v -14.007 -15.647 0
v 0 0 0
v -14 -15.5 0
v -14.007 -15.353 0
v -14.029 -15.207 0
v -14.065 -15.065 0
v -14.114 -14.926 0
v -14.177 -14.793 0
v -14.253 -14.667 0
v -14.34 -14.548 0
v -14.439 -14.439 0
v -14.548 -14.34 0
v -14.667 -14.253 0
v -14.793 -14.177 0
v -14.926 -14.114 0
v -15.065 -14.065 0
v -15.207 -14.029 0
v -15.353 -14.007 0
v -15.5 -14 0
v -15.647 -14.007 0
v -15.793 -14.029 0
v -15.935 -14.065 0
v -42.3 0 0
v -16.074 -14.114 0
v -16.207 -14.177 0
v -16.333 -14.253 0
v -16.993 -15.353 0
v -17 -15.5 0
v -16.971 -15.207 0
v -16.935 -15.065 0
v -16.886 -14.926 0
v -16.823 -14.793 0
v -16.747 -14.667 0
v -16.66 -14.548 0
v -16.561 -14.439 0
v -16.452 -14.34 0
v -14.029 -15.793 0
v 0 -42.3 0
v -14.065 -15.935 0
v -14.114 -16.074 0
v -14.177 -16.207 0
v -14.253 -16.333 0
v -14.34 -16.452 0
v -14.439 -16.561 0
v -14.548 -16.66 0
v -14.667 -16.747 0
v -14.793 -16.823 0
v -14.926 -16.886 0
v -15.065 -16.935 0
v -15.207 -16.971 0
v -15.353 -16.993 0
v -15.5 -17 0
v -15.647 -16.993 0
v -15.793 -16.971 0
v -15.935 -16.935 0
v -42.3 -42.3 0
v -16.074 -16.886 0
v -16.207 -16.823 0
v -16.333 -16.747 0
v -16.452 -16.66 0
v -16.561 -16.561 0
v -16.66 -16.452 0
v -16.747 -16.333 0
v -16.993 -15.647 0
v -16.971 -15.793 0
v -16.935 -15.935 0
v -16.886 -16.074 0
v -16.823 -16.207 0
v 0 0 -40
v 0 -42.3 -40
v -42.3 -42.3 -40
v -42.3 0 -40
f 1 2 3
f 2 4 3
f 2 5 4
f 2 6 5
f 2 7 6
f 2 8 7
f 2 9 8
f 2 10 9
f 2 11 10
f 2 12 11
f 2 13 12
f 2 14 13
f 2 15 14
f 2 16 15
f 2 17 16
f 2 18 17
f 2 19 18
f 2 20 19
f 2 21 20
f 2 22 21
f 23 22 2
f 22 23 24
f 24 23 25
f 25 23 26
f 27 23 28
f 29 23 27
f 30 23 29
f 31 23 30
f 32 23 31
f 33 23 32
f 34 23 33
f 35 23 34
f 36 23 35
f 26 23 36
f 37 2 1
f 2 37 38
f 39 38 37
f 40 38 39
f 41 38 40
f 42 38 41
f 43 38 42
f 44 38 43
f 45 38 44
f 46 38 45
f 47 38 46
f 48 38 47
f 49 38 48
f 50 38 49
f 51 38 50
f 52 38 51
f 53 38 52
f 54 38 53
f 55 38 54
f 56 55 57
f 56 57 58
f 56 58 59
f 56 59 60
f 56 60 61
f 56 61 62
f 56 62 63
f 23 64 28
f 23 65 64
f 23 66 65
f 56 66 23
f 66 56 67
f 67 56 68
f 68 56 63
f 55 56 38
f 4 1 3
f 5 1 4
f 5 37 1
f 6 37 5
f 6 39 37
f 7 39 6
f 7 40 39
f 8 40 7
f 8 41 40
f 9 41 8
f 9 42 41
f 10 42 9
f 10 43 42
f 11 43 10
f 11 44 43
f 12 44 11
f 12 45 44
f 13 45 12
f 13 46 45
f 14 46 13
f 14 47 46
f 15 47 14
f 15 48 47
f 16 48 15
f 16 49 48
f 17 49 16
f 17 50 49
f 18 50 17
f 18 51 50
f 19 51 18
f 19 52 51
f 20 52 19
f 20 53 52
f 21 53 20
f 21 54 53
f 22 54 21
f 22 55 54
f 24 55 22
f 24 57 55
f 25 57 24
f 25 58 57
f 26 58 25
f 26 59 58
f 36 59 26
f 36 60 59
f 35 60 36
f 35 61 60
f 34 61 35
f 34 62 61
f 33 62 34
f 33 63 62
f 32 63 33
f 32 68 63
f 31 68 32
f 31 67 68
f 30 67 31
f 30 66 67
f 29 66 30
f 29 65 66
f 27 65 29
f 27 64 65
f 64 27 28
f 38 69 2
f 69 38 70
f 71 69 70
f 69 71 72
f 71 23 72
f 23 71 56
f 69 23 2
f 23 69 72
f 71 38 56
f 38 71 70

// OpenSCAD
module stepper_motor() {
    difference() {
        // Main body of the motor
        translate([-21.15, -21.15, -20])
            cube([42.3, 42.3, 40], center = true);
        
        // Shaft
        translate([0, 0, 20])
            cylinder(h = 20, d = 8, $fn = 64);
        
        // Mounting holes
        for (x = [-15.5, 15.5])
            for (y = [-15.5, 15.5])
                translate([x, y, 0])
                    cylinder(h = 40, d = 3, $fn = 64);
    }
}

stepper_motor();
